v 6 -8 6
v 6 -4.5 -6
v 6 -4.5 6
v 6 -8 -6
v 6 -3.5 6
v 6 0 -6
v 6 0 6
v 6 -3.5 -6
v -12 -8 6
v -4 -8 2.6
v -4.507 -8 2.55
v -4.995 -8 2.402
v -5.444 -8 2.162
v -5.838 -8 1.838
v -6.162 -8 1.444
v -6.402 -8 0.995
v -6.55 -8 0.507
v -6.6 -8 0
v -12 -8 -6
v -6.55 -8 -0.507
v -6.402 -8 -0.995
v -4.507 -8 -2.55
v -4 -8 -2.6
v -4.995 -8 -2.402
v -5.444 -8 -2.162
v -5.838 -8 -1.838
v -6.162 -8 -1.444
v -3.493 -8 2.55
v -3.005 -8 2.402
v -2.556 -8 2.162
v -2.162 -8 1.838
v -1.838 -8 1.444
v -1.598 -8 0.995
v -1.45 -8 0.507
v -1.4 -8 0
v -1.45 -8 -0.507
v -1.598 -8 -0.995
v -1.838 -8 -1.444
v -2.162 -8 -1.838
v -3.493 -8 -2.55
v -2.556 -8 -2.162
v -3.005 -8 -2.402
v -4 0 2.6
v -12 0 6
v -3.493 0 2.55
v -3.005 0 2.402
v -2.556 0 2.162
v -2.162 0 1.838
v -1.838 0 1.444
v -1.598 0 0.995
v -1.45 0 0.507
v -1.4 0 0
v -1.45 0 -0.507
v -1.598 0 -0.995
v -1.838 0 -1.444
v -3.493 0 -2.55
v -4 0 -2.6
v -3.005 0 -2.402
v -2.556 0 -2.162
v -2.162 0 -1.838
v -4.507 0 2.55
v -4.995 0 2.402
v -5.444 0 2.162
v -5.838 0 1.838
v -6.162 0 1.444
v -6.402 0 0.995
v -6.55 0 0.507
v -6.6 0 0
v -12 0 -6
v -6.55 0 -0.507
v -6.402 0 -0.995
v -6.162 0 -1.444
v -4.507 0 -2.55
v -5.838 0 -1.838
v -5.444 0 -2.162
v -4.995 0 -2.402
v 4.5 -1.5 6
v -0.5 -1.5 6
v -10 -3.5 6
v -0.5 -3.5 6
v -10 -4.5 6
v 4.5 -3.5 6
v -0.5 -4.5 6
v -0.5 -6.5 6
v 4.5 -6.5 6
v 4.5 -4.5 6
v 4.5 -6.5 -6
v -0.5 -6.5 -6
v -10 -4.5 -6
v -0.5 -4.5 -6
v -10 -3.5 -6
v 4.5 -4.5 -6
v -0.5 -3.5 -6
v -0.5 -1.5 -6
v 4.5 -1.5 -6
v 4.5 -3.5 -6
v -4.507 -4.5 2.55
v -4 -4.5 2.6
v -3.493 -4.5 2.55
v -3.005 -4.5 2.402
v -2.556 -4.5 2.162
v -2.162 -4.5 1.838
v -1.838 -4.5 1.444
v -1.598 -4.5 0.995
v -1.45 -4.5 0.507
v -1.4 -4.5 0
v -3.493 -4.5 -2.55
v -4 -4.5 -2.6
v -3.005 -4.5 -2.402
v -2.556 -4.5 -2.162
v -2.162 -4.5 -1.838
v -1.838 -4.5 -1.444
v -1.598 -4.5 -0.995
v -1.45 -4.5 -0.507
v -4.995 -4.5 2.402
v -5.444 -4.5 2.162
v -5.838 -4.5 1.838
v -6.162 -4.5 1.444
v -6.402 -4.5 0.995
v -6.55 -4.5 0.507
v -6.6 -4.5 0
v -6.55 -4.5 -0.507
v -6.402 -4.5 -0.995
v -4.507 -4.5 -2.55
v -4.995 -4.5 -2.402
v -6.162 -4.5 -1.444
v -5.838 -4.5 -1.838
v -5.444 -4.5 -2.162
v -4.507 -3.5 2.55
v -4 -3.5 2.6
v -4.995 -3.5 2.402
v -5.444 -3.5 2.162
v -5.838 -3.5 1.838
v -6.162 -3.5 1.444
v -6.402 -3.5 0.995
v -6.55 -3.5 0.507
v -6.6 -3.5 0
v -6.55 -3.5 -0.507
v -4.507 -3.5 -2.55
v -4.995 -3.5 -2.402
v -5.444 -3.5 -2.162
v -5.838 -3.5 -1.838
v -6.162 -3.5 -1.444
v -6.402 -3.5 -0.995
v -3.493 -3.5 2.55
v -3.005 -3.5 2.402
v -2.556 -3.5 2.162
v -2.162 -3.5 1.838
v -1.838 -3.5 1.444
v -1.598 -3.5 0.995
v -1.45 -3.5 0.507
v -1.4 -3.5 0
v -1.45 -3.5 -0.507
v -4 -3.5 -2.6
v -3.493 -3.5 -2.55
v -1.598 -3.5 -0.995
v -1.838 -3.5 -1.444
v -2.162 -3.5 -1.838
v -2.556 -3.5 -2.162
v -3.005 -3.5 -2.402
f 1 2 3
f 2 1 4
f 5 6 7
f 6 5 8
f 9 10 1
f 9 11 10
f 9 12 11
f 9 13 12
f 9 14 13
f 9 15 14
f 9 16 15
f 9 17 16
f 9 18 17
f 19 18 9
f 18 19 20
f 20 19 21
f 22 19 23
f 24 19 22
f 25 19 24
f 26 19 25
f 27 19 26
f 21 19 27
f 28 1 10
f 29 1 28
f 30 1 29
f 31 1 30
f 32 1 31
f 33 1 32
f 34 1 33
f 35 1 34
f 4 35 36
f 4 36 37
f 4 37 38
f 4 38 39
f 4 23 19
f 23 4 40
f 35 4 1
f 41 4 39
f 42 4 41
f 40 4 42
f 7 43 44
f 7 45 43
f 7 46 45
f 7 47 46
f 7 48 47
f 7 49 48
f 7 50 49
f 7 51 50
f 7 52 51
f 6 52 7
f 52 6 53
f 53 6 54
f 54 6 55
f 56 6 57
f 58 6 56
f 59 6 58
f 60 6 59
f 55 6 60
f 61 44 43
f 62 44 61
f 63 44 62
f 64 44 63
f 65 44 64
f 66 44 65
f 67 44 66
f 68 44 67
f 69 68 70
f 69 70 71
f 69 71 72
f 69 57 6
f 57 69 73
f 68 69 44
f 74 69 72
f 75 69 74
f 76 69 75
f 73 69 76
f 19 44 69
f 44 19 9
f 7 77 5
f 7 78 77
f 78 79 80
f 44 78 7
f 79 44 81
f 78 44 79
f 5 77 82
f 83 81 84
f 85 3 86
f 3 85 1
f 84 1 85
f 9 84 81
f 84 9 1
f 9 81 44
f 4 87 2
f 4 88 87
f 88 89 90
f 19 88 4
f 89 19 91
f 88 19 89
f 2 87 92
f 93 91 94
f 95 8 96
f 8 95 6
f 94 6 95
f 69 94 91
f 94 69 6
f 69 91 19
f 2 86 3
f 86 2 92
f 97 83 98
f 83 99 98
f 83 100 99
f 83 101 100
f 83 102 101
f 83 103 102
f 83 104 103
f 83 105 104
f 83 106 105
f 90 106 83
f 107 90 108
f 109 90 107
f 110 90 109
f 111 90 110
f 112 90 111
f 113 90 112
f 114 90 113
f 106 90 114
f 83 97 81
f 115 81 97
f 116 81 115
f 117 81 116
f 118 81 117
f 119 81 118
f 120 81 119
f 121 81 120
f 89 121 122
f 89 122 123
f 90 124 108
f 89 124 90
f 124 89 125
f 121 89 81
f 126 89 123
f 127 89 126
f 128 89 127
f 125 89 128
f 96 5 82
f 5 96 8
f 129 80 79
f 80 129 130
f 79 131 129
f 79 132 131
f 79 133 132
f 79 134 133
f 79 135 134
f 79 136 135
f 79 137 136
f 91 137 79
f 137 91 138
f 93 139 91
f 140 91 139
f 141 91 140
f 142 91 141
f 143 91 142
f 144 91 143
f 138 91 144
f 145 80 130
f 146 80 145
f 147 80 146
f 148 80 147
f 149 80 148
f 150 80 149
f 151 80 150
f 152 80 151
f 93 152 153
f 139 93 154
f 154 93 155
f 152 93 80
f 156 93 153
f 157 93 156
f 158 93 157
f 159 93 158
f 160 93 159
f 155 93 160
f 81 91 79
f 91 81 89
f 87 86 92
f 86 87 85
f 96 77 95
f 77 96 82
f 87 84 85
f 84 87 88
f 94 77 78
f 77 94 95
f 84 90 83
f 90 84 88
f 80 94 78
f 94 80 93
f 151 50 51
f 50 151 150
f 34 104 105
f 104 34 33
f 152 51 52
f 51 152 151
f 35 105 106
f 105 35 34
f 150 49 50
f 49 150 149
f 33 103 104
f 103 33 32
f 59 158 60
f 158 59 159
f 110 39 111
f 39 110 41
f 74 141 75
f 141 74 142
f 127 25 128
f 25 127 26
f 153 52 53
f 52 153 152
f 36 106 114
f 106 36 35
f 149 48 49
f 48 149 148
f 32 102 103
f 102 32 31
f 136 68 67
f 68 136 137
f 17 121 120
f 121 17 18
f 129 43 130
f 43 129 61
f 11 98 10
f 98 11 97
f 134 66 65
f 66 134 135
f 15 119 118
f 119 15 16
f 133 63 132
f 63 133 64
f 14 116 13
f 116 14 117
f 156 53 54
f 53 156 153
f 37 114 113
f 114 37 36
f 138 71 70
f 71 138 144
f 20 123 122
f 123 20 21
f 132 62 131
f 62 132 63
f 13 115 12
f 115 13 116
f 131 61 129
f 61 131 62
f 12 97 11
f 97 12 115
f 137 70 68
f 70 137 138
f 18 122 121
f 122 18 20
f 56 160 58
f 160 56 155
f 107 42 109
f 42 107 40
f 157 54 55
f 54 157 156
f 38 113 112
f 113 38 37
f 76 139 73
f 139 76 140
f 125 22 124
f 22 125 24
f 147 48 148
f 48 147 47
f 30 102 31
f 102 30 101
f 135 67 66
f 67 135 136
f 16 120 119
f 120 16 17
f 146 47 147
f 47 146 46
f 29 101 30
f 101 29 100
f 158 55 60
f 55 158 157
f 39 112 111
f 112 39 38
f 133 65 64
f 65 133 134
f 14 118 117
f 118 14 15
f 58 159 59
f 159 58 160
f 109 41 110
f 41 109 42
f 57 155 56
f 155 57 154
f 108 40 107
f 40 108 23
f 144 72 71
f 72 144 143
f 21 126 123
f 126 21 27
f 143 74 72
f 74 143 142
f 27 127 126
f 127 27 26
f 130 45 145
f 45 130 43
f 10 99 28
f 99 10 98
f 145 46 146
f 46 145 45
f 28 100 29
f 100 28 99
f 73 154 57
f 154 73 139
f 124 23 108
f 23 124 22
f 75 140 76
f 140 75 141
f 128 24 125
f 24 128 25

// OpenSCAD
$fn=32;

thick=8;
main_size=12;
crack_size=1;
channel=5;
screw_d=5.2;

rotate([90,0,0])
    difference() {
        union() {
            translate([-main_size,-main_size/2,0])
                cube([main_size*1.5,main_size,thick]);
        }
        translate([2,0,thick/2])
            cube([main_size*2,main_size*2,crack_size],center=true);
        translate([2,0,thick/2])
            cube([channel,main_size*2,channel],center=true);
        translate([-4,0,-1]) {
            cylinder(h=thick*2,d=screw_d);
        }
    }
